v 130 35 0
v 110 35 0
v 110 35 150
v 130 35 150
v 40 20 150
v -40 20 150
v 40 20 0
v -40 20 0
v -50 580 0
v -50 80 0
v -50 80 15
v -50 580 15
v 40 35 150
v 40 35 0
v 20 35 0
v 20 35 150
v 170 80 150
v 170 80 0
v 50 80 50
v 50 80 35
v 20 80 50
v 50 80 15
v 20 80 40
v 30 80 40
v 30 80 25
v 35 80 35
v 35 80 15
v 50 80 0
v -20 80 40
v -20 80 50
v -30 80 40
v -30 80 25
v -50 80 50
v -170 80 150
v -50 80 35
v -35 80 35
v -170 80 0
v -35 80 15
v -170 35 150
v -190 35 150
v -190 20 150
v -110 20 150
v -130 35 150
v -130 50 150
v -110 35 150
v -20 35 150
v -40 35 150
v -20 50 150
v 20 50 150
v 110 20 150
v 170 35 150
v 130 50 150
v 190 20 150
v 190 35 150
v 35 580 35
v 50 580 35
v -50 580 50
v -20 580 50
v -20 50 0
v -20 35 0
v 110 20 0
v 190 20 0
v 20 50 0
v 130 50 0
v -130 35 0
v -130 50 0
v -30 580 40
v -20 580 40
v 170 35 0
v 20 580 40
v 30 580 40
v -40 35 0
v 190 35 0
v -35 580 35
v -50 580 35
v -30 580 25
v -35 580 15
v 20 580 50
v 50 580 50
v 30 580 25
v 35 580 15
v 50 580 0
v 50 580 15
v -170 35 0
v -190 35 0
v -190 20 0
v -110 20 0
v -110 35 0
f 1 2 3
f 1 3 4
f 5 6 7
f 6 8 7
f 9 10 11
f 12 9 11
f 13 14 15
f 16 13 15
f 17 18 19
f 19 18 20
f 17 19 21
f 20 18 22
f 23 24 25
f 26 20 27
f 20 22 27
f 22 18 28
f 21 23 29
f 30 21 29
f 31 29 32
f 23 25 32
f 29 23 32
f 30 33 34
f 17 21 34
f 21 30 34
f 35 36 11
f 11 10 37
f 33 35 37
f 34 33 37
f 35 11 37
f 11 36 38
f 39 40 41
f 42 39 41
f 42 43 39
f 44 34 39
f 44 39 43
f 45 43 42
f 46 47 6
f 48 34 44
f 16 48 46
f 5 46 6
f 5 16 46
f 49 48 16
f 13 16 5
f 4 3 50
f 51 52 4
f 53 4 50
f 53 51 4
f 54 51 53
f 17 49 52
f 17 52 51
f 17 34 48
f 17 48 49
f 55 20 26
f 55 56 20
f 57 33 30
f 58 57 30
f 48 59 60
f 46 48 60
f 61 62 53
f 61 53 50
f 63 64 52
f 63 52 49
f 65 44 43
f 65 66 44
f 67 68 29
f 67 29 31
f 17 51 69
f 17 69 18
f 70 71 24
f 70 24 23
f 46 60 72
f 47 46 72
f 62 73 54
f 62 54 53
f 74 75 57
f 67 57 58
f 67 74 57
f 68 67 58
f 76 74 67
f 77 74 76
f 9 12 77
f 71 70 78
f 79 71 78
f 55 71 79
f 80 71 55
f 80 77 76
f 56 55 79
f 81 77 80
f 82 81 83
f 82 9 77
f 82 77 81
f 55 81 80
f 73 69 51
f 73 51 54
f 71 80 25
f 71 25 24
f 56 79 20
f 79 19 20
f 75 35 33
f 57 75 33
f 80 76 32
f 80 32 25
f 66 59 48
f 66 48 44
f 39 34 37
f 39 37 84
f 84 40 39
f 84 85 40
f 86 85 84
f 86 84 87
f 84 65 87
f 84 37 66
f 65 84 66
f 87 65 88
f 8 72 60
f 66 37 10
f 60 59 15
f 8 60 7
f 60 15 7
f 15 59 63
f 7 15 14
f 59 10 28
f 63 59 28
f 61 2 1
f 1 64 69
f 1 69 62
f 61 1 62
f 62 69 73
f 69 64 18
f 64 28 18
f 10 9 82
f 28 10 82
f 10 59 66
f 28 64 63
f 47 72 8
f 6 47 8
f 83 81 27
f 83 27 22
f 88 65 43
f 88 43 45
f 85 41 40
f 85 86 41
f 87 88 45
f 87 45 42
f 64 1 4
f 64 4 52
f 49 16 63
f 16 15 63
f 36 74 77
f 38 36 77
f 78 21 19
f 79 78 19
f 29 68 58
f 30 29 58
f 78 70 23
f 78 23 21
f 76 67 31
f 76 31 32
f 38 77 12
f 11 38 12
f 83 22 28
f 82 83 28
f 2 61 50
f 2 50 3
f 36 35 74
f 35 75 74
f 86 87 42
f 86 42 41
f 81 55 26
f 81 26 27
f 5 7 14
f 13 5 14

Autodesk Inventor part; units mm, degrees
ref_plane "YZ Plane" through (0, 0, 0) normal (1, 0, 0) x (0, 1, 0)
ref_plane "XZ Plane" through (0, 0, 0) normal (0, 1, 0) x (-1, 0, 0)
ref_plane "XY Plane" through (0, 0, 0) normal (0, 0, 1) x (1, 0, 0)
sketch "Sketch1" plane through (0, 0, 0) normal (0, 0, 1) x (1, 0, 0)
  line L0 (-300, 0) -> (300, 0)
  line L1 (300, 0) -> (300, 50)
  line L2 (-300, 50) -> (-300, 0)
  line L3 (-20, 50) -> (-20, 35)
  line L4 (-20, 35) -> (-40, 35)
  line L5 (-40, 35) -> (-40, 20)
  line L6 (-40, 20) -> (40, 20)
  line L7 (40, 20) -> (40, 35)
  line L8 (40, 35) -> (20, 35)
  line L9 (20, 35) -> (20, 50)
  line L10 (-75, 159.793) -> (-75, -97.8722) construction
  line L11 (75, 159.793) -> (75, -92.8199) construction
  line L12 (-110, 20) -> (-190, 20)
  line L13 (-190, 20) -> (-190, 35)
  line L14 (-110, 35) -> (-110, 20)
  line L15 (-130, 35) -> (-110, 35)
  line L16 (-130, 50) -> (-130, 35)
  line L17 (-170, 35) -> (-170, 50)
  line L18 (-190, 35) -> (-170, 35)
  line L19 (170, 50) -> (170, 35)
  line L20 (170, 35) -> (190, 35)
  line L21 (190, 35) -> (190, 20)
  line L22 (190, 20) -> (110, 20)
  line L23 (110, 20) -> (110, 35)
  line L24 (110, 35) -> (130, 35)
  line L25 (130, 35) -> (130, 50)
  line L26 (-20, 50) -> (-130, 50)
  line L27 (-170, 50) -> (-300, 50)
  line L28 (300, 50) -> (170, 50)
  line L29 (130, 50) -> (20, 50)
  line L30 (170, 35) -> (170, 80)
  line L31 (170, 80) -> (-170, 80)
  line L32 (-170, 80) -> (-170, 35)
  point P0 (0, 0)
  point P1 (0, 0)
  dimension "d0" = 300
  dimension "d1" = 600
  dimension "d2" = 50
  dimension "d3" = 50
  dimension "d4" = 20
  dimension "d5" = 20
  dimension "d6" = 20
  dimension "d7" = 20
  dimension "d8" = 30
  dimension "d9" = 15
  dimension "d10" = 15
  dimension "d11" = 75
  dimension "d12" = 75
  dimension "d13" = 15
  dimension "d14" = 109.793
  dimension "d15" = 142.8199
  dimension "d16" = 109.793
  dimension "d17" = 147.8722
  dimension "d18" = 45
sketch "Sketch2" plane through (0, 0, 0) normal (0, 0, 1) x (1, 0, 0)
  point P0 (0, 0)
extrude "Extrusion1" add sketch "Sketch1" along normal blind 150 contours L32 L31 L30 L19 L20 L21 L22 L23 L24 L25 L29 L9 L8 L7 L6 L5 L4 L3 L26 L16 L15 L14 L12 L13 L18 L17
sketch "Sketch3" plane through (-170, 80, 0) normal (0, 1, 0) x (1, 0, 0)
  line L0 (170, 0) -> (130, 0)
  line L1 (130, 0) -> (130, -50) construction
  line L2 (130, -50) -> (170, -50)
  line L3 (340, 0) -> (0, 0) projected
  line L4 (170, -50) -> (210, -50)
  line L5 (210, -50) -> (210, 0) construction
  line L6 (210, 0) -> (170, 0)
  line L7 (120, -50) -> (220, -50)
  line L8 (220, -50) -> (220, 0)
  line L9 (220, 0) -> (120, 0)
  line L10 (120, 0) -> (120, -50)
  line L11 (120, -50) -> (220, 0) construction
  line L12 (220, -50) -> (120, 0) construction
  point P0 (170, -25)
  dimension "d21" = 40
  dimension "d22" = 50
  dimension "d23" = 40
  dimension "d36" = 100
extrude "Extrusion2" add sketch "Sketch3" along normal blind 500
sketch "Sketch5" plane through (-170, 580, 0) normal (0, 1, 0) x (1, 0, 0)
  line L0 (150, 0) -> (150, -150) projected
  line L1 (190, -60) -> (150, -60)
  line L2 (150, -60) -> (150, -40)
  line L3 (150, -40) -> (190, -40) construction
  line L4 (190, -40) -> (190, -60)
  line L5 (220, -50) -> (120, -50) projected
  line L6 (190, -60) -> (150, -40) construction
  line L7 (150, -60) -> (190, -40) construction
  line L8 (150, -40) -> (140, -40)
  line L9 (140, -40) -> (140, -25)
  line L10 (140, -25) -> (200, -25)
  line L11 (200, -25) -> (200, -40)
  line L12 (200, -40) -> (190, -40)
  point P0 (170, 0)
  point P1 (170, -50)
  point P2 (210, -50)
  point P3 (130, -50)
  point P4 (170, -50)
  dimension "d26" = 10
  dimension "d27" = 15
  dimension "d28" = 60
  dimension "d31" = 20
extrude "Extrusion3" cut sketch "Sketch5" against normal blind 500
sketch "Sketch6" plane through (-170, 580, 0) normal (0, 1, 0) x (1, 0, 0)
  line L0 (130, 0) -> (130, -150) projected
  line L1 (150, 0) -> (150, -150) projected
  line L2 (135, -30) -> (135, -20)
  line L3 (170, 0) -> (170, -54.7641) construction
  line L4 (120, -50) -> (120, 0) projected
  line L5 (120, -20) -> (120, -30)
  line L6 (220, 0) -> (220, -50) projected
  line L7 (135, -20) -> (135, -15)
  line L8 (135, -15) -> (120, -15)
  line L9 (120, -30) -> (120, -35)
  line L10 (120, -35) -> (135, -35)
  line L11 (135, -35) -> (135, -30)
  line L12 (120, -15) -> (120, -20)
  line L13 (205, -30) -> (205, -20)
  line L14 (220, -50) -> (220, 0)
  line L15 (205, -20) -> (205, -15)
  line L16 (205, -15) -> (220, -15)
  line L17 (220, -30) -> (220, -35)
  line L18 (220, -35) -> (205, -35)
  line L19 (205, -35) -> (205, -30)
  point P0 (130, -35)
  point P1 (130, -15)
  dimension "d38" = 5
  dimension "d39" = 15
extrude "Extrusion4" cut sketch "Sketch6" against normal blind 500
properties part number "Clamp jaw handle"
